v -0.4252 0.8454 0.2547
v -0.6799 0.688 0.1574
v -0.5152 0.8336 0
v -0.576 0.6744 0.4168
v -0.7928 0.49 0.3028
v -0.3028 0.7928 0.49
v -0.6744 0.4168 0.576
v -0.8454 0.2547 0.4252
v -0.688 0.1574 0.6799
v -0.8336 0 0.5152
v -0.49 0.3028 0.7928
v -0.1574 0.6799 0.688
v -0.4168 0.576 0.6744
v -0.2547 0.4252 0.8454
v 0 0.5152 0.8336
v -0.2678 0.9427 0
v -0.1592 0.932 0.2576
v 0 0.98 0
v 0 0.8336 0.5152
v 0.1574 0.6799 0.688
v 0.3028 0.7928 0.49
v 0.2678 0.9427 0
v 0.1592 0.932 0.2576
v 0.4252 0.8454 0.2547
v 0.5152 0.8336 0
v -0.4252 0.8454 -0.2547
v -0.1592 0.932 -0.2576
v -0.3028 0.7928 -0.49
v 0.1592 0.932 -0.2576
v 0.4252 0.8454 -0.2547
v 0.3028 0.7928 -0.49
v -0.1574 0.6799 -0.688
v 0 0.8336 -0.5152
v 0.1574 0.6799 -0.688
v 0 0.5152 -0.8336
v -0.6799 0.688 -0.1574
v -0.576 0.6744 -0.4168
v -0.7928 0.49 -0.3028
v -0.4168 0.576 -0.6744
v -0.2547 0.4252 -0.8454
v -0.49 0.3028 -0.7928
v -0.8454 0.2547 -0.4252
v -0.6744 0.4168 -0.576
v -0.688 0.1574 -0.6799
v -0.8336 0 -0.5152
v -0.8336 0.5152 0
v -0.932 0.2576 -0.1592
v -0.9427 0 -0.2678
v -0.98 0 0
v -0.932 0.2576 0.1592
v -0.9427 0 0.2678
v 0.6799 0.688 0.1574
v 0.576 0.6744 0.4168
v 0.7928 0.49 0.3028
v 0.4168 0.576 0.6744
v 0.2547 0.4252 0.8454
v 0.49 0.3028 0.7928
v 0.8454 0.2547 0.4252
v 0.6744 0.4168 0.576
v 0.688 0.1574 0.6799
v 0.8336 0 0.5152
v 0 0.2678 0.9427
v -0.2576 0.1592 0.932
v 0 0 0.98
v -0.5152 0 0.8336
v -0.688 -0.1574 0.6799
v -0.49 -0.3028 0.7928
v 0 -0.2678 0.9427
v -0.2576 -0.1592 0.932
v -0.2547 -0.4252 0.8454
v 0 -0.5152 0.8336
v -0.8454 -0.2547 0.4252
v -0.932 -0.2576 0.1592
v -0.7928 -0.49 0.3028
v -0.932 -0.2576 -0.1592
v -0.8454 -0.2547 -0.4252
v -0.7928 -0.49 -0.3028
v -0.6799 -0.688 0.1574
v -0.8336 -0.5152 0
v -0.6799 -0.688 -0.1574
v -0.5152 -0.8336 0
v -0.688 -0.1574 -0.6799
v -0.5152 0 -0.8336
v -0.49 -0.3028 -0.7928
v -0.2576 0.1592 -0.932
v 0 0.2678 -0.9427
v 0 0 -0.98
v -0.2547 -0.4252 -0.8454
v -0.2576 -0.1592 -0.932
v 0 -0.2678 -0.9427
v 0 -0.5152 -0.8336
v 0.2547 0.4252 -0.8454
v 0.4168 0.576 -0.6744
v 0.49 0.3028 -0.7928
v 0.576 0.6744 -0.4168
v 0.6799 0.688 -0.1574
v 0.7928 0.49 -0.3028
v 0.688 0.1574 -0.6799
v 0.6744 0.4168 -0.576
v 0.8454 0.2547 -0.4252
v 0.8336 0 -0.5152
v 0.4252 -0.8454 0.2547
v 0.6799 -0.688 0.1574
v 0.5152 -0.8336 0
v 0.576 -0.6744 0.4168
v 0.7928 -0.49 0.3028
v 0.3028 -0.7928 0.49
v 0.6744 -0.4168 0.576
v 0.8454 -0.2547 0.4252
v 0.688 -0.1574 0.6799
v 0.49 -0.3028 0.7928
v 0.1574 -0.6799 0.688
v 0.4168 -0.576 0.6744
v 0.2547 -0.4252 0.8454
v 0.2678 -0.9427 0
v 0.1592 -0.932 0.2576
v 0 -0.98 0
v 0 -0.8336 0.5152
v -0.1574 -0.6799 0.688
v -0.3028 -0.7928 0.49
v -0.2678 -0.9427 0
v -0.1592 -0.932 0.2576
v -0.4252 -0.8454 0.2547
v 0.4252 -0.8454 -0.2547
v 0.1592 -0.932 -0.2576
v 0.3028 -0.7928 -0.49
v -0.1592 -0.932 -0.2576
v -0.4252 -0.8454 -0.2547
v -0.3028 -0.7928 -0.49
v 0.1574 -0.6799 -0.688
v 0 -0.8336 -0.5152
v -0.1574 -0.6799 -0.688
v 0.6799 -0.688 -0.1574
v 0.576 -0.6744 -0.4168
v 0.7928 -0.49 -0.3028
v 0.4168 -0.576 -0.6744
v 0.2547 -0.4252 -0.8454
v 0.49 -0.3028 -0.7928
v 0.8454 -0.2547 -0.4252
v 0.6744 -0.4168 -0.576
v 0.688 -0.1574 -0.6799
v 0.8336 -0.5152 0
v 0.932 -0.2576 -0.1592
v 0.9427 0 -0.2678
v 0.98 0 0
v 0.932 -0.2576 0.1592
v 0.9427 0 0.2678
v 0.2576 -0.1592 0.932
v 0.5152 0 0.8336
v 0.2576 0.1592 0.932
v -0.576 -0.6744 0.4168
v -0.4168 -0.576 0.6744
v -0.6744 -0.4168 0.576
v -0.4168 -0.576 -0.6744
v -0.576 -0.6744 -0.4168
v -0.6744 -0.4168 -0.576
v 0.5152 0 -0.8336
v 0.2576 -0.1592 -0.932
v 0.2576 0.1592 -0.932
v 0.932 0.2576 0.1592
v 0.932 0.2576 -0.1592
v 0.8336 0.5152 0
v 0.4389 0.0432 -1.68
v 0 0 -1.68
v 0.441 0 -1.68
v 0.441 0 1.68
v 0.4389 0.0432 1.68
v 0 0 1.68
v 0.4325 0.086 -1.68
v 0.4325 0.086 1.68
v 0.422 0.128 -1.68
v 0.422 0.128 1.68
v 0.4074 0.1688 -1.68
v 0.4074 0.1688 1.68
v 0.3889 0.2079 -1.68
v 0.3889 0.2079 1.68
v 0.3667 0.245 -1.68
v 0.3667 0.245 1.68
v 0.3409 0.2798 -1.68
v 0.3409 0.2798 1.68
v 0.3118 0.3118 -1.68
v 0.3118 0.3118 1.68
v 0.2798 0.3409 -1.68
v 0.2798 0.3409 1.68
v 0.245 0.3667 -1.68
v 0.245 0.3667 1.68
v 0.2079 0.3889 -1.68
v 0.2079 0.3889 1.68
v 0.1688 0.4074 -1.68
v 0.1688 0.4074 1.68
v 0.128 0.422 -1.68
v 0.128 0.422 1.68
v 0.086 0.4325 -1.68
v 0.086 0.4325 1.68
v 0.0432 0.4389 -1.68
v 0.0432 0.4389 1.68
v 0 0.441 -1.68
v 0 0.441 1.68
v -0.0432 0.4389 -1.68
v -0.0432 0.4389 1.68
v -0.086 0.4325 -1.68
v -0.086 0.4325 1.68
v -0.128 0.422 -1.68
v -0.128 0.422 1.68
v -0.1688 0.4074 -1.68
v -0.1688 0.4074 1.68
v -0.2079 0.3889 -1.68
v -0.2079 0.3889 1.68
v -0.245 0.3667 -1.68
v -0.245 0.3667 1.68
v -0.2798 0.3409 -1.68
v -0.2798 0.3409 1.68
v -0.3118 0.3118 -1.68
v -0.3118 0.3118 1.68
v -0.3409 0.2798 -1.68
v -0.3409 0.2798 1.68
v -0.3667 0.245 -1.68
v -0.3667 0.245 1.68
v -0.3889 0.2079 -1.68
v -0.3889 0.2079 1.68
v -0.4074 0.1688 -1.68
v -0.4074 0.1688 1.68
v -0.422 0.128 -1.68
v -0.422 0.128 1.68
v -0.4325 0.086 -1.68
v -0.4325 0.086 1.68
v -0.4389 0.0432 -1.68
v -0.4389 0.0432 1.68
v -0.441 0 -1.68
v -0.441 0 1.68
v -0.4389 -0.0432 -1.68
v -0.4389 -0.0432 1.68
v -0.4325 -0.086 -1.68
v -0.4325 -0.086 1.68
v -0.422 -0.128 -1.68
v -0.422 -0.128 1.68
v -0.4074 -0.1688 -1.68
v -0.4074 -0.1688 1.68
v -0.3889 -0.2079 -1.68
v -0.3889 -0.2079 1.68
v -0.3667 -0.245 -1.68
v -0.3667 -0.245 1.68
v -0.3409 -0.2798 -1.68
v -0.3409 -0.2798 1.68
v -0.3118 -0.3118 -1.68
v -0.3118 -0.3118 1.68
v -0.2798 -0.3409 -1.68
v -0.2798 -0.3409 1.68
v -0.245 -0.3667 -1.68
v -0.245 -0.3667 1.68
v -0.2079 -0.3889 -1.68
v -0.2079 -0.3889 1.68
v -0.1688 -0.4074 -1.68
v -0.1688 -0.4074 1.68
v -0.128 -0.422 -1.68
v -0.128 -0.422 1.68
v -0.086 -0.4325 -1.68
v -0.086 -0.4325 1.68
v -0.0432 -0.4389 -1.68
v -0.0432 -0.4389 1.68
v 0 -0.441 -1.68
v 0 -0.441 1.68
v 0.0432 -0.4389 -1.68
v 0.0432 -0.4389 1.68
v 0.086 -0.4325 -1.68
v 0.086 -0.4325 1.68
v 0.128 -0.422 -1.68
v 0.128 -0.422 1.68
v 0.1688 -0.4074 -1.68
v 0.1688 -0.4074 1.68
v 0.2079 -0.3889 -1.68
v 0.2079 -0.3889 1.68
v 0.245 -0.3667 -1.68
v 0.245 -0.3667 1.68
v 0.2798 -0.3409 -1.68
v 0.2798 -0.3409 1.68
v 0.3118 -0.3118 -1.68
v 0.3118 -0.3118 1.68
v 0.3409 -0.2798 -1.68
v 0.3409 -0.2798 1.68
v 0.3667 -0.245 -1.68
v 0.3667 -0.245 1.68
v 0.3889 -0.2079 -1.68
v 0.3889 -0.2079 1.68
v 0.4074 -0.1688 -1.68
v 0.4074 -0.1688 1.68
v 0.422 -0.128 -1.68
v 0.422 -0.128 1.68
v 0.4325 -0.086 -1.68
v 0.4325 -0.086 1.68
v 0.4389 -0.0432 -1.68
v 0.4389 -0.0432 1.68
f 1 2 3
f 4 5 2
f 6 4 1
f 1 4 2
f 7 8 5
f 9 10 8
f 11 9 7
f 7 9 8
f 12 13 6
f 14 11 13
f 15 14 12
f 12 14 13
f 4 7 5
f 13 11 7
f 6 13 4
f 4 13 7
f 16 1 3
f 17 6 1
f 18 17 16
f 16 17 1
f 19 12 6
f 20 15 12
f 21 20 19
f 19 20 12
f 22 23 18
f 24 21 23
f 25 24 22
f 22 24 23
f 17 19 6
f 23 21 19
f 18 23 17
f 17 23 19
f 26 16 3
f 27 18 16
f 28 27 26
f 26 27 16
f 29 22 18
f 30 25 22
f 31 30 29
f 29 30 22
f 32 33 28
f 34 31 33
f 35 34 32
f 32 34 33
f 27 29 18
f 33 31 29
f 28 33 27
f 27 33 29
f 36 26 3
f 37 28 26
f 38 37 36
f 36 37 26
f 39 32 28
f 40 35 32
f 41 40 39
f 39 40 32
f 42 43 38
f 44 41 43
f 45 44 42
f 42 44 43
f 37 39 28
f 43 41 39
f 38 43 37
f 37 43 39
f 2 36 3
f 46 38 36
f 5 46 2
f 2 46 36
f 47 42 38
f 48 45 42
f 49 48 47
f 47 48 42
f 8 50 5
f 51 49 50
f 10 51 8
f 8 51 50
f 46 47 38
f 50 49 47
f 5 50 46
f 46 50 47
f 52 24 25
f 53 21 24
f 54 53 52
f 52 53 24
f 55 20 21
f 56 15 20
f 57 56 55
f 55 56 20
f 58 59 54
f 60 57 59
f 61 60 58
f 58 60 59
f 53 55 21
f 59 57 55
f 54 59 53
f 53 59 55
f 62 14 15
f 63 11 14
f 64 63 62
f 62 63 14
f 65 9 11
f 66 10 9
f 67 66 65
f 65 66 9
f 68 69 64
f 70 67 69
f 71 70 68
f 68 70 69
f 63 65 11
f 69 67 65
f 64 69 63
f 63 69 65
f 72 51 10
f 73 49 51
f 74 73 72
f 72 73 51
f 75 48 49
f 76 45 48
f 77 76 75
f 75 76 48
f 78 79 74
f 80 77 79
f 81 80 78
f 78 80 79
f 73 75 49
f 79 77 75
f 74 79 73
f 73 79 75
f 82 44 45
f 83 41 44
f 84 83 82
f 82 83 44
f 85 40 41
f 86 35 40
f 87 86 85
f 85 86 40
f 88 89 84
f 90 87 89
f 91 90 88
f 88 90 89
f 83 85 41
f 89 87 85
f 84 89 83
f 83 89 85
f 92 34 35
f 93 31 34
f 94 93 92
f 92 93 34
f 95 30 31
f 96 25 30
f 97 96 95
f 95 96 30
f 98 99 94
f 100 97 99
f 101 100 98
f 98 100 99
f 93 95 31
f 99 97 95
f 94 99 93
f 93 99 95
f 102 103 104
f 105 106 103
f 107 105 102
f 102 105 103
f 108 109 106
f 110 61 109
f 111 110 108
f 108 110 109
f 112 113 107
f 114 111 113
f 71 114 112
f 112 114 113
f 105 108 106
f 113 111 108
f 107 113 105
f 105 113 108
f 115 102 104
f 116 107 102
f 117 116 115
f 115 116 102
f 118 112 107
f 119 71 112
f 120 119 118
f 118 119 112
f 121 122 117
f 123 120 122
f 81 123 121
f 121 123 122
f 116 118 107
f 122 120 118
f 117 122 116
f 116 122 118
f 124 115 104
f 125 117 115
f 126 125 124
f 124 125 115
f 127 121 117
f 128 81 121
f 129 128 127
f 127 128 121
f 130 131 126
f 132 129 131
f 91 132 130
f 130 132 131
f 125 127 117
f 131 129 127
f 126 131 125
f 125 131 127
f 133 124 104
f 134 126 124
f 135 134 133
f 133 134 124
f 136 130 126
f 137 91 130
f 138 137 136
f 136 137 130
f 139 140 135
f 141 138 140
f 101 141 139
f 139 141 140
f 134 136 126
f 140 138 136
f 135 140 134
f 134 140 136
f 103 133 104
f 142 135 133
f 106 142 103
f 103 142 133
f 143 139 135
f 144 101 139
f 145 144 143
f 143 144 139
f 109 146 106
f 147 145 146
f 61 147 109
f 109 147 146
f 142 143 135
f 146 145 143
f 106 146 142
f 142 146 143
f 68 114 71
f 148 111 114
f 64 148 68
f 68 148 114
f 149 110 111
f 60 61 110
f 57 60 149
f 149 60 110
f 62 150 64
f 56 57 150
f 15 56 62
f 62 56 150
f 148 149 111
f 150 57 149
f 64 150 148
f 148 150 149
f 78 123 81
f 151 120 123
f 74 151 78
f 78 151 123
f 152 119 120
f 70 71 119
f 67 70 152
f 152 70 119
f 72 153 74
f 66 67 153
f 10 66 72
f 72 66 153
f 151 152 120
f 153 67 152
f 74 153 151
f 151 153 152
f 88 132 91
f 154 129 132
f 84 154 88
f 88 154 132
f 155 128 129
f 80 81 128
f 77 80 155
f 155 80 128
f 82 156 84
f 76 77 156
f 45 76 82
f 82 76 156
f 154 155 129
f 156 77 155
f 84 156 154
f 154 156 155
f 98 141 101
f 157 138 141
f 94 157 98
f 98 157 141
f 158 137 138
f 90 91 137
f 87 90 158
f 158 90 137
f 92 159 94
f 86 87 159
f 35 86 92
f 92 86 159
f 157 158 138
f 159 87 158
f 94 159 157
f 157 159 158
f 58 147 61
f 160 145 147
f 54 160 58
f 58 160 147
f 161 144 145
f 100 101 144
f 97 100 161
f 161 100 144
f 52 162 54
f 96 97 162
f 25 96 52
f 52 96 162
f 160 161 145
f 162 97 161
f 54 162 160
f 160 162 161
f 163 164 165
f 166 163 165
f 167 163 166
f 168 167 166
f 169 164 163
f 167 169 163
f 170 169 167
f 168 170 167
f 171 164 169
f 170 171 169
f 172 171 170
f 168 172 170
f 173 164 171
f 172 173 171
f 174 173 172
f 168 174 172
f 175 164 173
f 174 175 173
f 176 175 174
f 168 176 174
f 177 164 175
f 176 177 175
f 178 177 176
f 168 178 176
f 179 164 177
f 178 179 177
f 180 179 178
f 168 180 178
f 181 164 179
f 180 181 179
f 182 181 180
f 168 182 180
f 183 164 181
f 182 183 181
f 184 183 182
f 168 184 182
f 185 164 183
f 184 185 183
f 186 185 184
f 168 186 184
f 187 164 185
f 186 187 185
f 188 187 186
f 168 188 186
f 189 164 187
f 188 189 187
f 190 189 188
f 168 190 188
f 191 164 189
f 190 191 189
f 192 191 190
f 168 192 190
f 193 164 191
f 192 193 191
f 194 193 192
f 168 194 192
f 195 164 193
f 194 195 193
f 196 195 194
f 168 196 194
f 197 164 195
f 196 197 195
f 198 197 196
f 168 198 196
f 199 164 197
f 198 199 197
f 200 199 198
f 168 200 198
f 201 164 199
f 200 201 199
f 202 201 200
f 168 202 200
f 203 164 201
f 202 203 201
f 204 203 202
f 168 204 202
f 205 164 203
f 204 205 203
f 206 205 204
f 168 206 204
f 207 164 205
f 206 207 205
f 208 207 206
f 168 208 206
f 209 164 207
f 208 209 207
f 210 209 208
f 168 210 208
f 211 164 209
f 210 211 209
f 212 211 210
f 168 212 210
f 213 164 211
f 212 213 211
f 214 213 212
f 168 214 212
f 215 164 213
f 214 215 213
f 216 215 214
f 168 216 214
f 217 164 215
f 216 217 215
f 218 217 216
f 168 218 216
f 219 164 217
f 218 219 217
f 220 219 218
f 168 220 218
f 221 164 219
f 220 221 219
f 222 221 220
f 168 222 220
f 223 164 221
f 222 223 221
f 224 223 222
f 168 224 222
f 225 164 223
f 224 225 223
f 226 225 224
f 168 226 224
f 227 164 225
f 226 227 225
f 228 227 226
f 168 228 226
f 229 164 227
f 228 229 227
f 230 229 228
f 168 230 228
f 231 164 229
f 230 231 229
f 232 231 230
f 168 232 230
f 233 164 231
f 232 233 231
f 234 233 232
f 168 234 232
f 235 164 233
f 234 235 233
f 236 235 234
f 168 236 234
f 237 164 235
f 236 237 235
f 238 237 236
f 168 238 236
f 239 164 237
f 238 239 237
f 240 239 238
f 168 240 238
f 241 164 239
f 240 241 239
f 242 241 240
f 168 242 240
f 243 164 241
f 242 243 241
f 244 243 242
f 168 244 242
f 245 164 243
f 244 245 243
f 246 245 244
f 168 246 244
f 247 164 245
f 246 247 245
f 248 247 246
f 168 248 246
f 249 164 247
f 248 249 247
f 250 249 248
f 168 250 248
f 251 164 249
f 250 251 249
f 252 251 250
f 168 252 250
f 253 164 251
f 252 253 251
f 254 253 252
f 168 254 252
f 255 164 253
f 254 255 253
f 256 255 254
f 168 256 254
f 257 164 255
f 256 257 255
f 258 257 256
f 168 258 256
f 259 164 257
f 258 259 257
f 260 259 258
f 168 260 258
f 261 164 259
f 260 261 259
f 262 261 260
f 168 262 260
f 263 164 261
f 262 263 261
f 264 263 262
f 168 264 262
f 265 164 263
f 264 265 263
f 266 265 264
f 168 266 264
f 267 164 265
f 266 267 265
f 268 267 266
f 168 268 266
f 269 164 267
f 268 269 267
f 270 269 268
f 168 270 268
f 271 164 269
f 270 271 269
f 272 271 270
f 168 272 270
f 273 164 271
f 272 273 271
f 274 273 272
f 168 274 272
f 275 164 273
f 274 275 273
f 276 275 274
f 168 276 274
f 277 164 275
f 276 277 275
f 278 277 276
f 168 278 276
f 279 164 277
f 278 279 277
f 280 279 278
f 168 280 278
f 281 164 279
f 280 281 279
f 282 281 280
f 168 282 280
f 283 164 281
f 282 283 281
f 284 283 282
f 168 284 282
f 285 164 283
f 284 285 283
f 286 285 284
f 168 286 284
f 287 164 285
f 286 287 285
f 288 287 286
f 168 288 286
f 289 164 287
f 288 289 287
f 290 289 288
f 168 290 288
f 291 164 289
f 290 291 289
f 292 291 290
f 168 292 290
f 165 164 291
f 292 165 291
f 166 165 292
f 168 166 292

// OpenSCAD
polyhedron(points=[
  [-0.5152164898767507, 0.833637792184999, 0.0],
  [0.5152164898767507, 0.833637792184999, 0.0],
  [-0.5152164898767507, -0.833637792184999, 0.0],
  [0.5152164898767507, -0.833637792184999, 0.0],
  [0.0, -0.5152164898767507, 0.833637792184999],
  [0.0, 0.5152164898767507, 0.833637792184999],
  [0.0, -0.5152164898767507, -0.833637792184999],
  [0.0, 0.5152164898767507, -0.833637792184999],
  [0.833637792184999, 0.0, -0.5152164898767507],
  [0.833637792184999, 0.0, 0.5152164898767507],
  [-0.833637792184999, 0.0, -0.5152164898767507],
  [-0.833637792184999, 0.0, 0.5152164898767507],
  [0.0, 0.9799999999999999, 0.0],
  [0.0, -0.9799999999999999, 0.0],
  [-0.3028366544874484, -0.7928366544874483, 0.48999999999999994],
  [0.3028366544874484, -0.7928366544874483, 0.48999999999999994],
  [-0.3028366544874484, 0.7928366544874483, 0.48999999999999994],
  [0.3028366544874484, 0.7928366544874483, 0.48999999999999994],
  [0.0, 0.0, 0.9799999999999999],
  [-0.3028366544874484, -0.7928366544874483, -0.48999999999999994],
  [0.3028366544874484, -0.7928366544874483, -0.48999999999999994],
  [-0.3028366544874484, 0.7928366544874483, -0.48999999999999994],
  [0.3028366544874484, 0.7928366544874483, -0.48999999999999994],
  [0.0, 0.0, -0.9799999999999999],
  [0.7928366544874483, 0.48999999999999994, -0.3028366544874484],
  [0.7928366544874483, -0.48999999999999994, -0.3028366544874484],
  [0.48999999999999994, -0.3028366544874484, -0.7928366544874483],
  [0.48999999999999994, 0.3028366544874484, -0.7928366544874483],
  [0.7928366544874483, 0.48999999999999994, 0.3028366544874484],
  [0.7928366544874483, -0.48999999999999994, 0.3028366544874484],
  [0.48999999999999994, -0.3028366544874484, 0.7928366544874483],
  [0.48999999999999994, 0.3028366544874484, 0.7928366544874483],
  [0.9799999999999999, 0.0, 0.0],
  [-0.7928366544874483, 0.48999999999999994, -0.3028366544874484],
  [-0.7928366544874483, -0.48999999999999994, -0.3028366544874484],
  [-0.48999999999999994, -0.3028366544874484, -0.7928366544874483],
  [-0.48999999999999994, 0.3028366544874484, -0.7928366544874483],
  [-0.7928366544874483, 0.48999999999999994, 0.3028366544874484],
  [-0.7928366544874483, -0.48999999999999994, 0.3028366544874484],
  [-0.48999999999999994, -0.3028366544874484, 0.7928366544874483],
  [-0.48999999999999994, 0.3028366544874484, 0.7928366544874483],
  [-0.9799999999999999, 0.0, 0.0],
  [-0.26780119833441823, 0.9426995906282389, 0.0],
  [0.26780119833441823, 0.9426995906282389, 0.0],
  [-0.26780119833441823, -0.9426995906282389, 0.0],
  [0.26780119833441823, -0.9426995906282389, 0.0],
  [-0.4252107932616408, -0.8454151108078624, 0.2546940747475993],
  [-0.15740959492722262, -0.6799048680092401, 0.6880055158806397],
  [-0.15921065115412408, -0.9320353859692504, 0.2576082449383755],
  [0.4252107932616408, -0.8454151108078624, 0.2546940747475993],
  [0.15740959492722262, -0.6799048680092401, 0.6880055158806397],
  [0.15921065115412408, -0.9320353859692504, 0.2576082449383755],
  [0.0, -0.8336377921849991, 0.515216489876751],
  [-0.4252107932616408, 0.8454151108078624, 0.2546940747475993],
  [-0.15740959492722262, 0.6799048680092401, 0.6880055158806397],
  [-0.15921065115412408, 0.9320353859692504, 0.2576082449383755],
  [0.4252107932616408, 0.8454151108078624, 0.2546940747475993],
  [0.15740959492722262, 0.6799048680092401, 0.6880055158806397],
  [0.15921065115412408, 0.9320353859692504, 0.2576082449383755],
  [0.0, 0.8336377921849991, 0.515216489876751],
  [0.0, -0.26780119833441823, 0.9426995906282389],
  [0.0, 0.26780119833441823, 0.9426995906282389],
  [-0.4252107932616408, -0.8454151108078624, -0.2546940747475993],
  [-0.15740959492722262, -0.6799048680092401, -0.6880055158806397],
  [-0.15921065115412408, -0.9320353859692504, -0.2576082449383755],
  [0.4252107932616408, -0.8454151108078624, -0.2546940747475993],
  [0.15740959492722262, -0.6799048680092401, -0.6880055158806397],
  [0.15921065115412408, -0.9320353859692504, -0.2576082449383755],
  [0.0, -0.8336377921849991, -0.515216489876751],
  [-0.4252107932616408, 0.8454151108078624, -0.2546940747475993],
  [-0.15740959492722262, 0.6799048680092401, -0.6880055158806397],
  [-0.15921065115412408, 0.9320353859692504, -0.2576082449383755],
  [0.4252107932616408, 0.8454151108078624, -0.2546940747475993],
  [0.15740959492722262, 0.6799048680092401, -0.6880055158806397],
  [0.15921065115412408, 0.9320353859692504, -0.2576082449383755],
  [0.0, 0.8336377921849991, -0.515216489876751],
  [0.0, -0.26780119833441823, -0.9426995906282389],
  [0.0, 0.26780119833441823, -0.9426995906282389],
  [0.6799048680092402, 0.6880055158806397, -0.15740959492722265],
  [0.8454151108078624, 0.2546940747475993, -0.4252107932616409],
  [0.5760295472466236, 0.674427141030875, -0.4168188960924995],
  [0.6799048680092402, -0.6880055158806397, -0.15740959492722265],
  [0.8454151108078624, -0.2546940747475993, -0.4252107932616409],
  [0.5760295472466236, -0.674427141030875, -0.4168188960924995],
  [0.2546940747475993, -0.4252107932616409, -0.8454151108078624],
  [0.6880055158806397, -0.15740959492722265, -0.6799048680092402],
  [0.4168188960924995, -0.5760295472466236, -0.674427141030875],
  [0.2576082449383755, -0.15921065115412408, -0.9320353859692504],
  [0.674427141030875, -0.41681889609249956, -0.5760295472466236],
  [0.2546940747475993, 0.4252107932616409, -0.8454151108078624],
  [0.6880055158806397, 0.15740959492722265, -0.6799048680092402],
  [0.4168188960924995, 0.5760295472466236, -0.674427141030875],
  [0.2576082449383755, 0.15921065115412408, -0.9320353859692504],
  [0.674427141030875, 0.41681889609249956, -0.5760295472466236],
  [0.5152164898767508, 0.0, -0.833637792184999],
  [0.6799048680092402, 0.6880055158806397, 0.15740959492722265],
  [0.8454151108078624, 0.2546940747475993, 0.4252107932616409],
  [0.5760295472466236, 0.674427141030875, 0.4168188960924995],
  [0.833637792184999, 0.5152164898767508, 0.0],
  [0.6799048680092402, -0.6880055158806397, 0.15740959492722265],
  [0.8454151108078624, -0.2546940747475993, 0.4252107932616409],
  [0.5760295472466236, -0.674427141030875, 0.4168188960924995],
  [0.833637792184999, -0.5152164898767508, 0.0],
  [0.2546940747475993, -0.4252107932616409, 0.8454151108078624],
  [0.6880055158806397, -0.15740959492722265, 0.6799048680092402],
  [0.4168188960924995, -0.5760295472466236, 0.674427141030875],
  [0.2576082449383755, -0.15921065115412408, 0.9320353859692504],
  [0.674427141030875, -0.41681889609249956, 0.5760295472466236],
  [0.2546940747475993, 0.4252107932616409, 0.8454151108078624],
  [0.6880055158806397, 0.15740959492722265, 0.6799048680092402],
  [0.4168188960924995, 0.5760295472466236, 0.674427141030875],
  [0.2576082449383755, 0.15921065115412408, 0.9320353859692504],
  [0.674427141030875, 0.41681889609249956, 0.5760295472466236],
  [0.5152164898767508, 0.0, 0.833637792184999],
  [0.9426995906282389, 0.0, -0.26780119833441823],
  [0.9426995906282389, 0.0, 0.26780119833441823],
  [0.9320353859692504, 0.2576082449383755, -0.15921065115412408],
  [0.9320353859692504, -0.2576082449383755, -0.15921065115412408],
  [0.9320353859692504, 0.2576082449383755, 0.15921065115412408],
  [0.9320353859692504, -0.2576082449383755, 0.15921065115412408],
  [-0.6799048680092402, 0.6880055158806397, -0.15740959492722265],
  [-0.8454151108078624, 0.2546940747475993, -0.4252107932616409],
  [-0.5760295472466236, 0.674427141030875, -0.4168188960924995],
  [-0.6799048680092402, -0.6880055158806397, -0.15740959492722265],
  [-0.8454151108078624, -0.2546940747475993, -0.4252107932616409],
  [-0.5760295472466236, -0.674427141030875, -0.4168188960924995],
  [-0.2546940747475993, -0.4252107932616409, -0.8454151108078624],
  [-0.6880055158806397, -0.15740959492722265, -0.6799048680092402],
  [-0.4168188960924995, -0.5760295472466236, -0.674427141030875],
  [-0.2576082449383755, -0.15921065115412408, -0.9320353859692504],
  [-0.674427141030875, -0.41681889609249956, -0.5760295472466236],
  [-0.2546940747475993, 0.4252107932616409, -0.8454151108078624],
  [-0.6880055158806397, 0.15740959492722265, -0.6799048680092402],
  [-0.4168188960924995, 0.5760295472466236, -0.674427141030875],
  [-0.2576082449383755, 0.15921065115412408, -0.9320353859692504],
  [-0.674427141030875, 0.41681889609249956, -0.5760295472466236],
  [-0.5152164898767508, 0.0, -0.833637792184999],
  [-0.6799048680092402, 0.6880055158806397, 0.15740959492722265],
  [-0.8454151108078624, 0.2546940747475993, 0.4252107932616409],
  [-0.5760295472466236, 0.674427141030875, 0.4168188960924995],
  [-0.833637792184999, 0.5152164898767508, 0.0],
  [-0.6799048680092402, -0.6880055158806397, 0.15740959492722265],
  [-0.8454151108078624, -0.2546940747475993, 0.4252107932616409],
  [-0.5760295472466236, -0.674427141030875, 0.4168188960924995],
  [-0.833637792184999, -0.5152164898767508, 0.0],
  [-0.2546940747475993, -0.4252107932616409, 0.8454151108078624],
  [-0.6880055158806397, -0.15740959492722265, 0.6799048680092402],
  [-0.4168188960924995, -0.5760295472466236, 0.674427141030875],
  [-0.2576082449383755, -0.15921065115412408, 0.9320353859692504],
  [-0.674427141030875, -0.41681889609249956, 0.5760295472466236],
  [-0.2546940747475993, 0.4252107932616409, 0.8454151108078624],
  [-0.6880055158806397, 0.15740959492722265, 0.6799048680092402],
  [-0.4168188960924995, 0.5760295472466236, 0.674427141030875],
  [-0.2576082449383755, 0.15921065115412408, 0.9320353859692504],
  [-0.674427141030875, 0.41681889609249956, 0.5760295472466236],
  [-0.5152164898767508, 0.0, 0.833637792184999],
  [-0.9426995906282389, 0.0, -0.26780119833441823],
  [-0.9426995906282389, 0.0, 0.26780119833441823],
  [-0.9320353859692504, 0.2576082449383755, -0.15921065115412408],
  [-0.9320353859692504, -0.2576082449383755, -0.15921065115412408],
  [-0.9320353859692504, 0.2576082449383755, 0.15921065115412408],
  [-0.9320353859692504, -0.2576082449383755, 0.15921065115412408],
  [0.0, 0.0, -1.68],
  [0.44099999999999995, 0.0, -1.68],
  [0.44099999999999995, 0.0, 1.68],
  [0.0, 0.0, 1.68],
  [0.4388764644624388, 0.04322555888533622, -1.68],
  [0.4388764644624388, 0.04322555888533622, 1.68],
  [0.43252630865782454, 0.08603483200911255, -1.68],
  [0.43252630865782454, 0.08603483200911255, 1.68],
  [0.42201068805790404, 0.12801554266921789, -1.68],
  [0.42201068805790404, 0.12801554266921789, 1.68],
  [0.4074308738374774, 0.16876339367300458, -1.68],
  [0.4074308738374774, 0.16876339367300458, 1.68],
  [0.3889272775776245, 0.20788596094026493, -1.68],
  [0.3889272775776245, 0.20788596094026493, 1.68],
  [0.3666780990254224, 0.24500647276164453, -1.68],
  [0.3666780990254224, 0.24500647276164453, 1.68],
  [0.34089760993296697, 0.2797674383161676, -1.68],
  [0.34089760993296697, 0.2797674383161676, 1.68],
  [0.31183409050326744, 0.3118340905032674, -1.68],
  [0.31183409050326744, 0.3118340905032674, 1.68],
  [0.2797674383161676, 0.34089760993296697, -1.68],
  [0.2797674383161676, 0.34089760993296697, 1.68],
  [0.24500647276164458, 0.3666780990254224, -1.68],
  [0.24500647276164458, 0.3666780990254224, 1.68],
  [0.207885960940265, 0.38892727757762446, -1.68],
  [0.207885960940265, 0.38892727757762446, 1.68],
  [0.1687633936730046, 0.4074308738374774, -1.68],
  [0.1687633936730046, 0.4074308738374774, 1.68],
  [0.12801554266921789, 0.4220106880579041, -1.68],
  [0.12801554266921789, 0.4220106880579041, 1.68],
  [0.08603483200911258, 0.43252630865782454, -1.68],
  [0.08603483200911258, 0.43252630865782454, 1.68],
  [0.043225558885336295, 0.4388764644624387, -1.68],
  [0.043225558885336295, 0.4388764644624387, 1.68],
  [2.7003461921199134e-17, 0.44099999999999995, -1.68],
  [2.7003461921199134e-17, 0.44099999999999995, 1.68],
  [-0.04322555888533624, 0.4388764644624388, -1.68],
  [-0.04322555888533624, 0.4388764644624388, 1.68],
  [-0.08603483200911252, 0.43252630865782454, -1.68],
  [-0.08603483200911252, 0.43252630865782454, 1.68],
  [-0.1280155426692178, 0.4220106880579041, -1.68],
  [-0.1280155426692178, 0.4220106880579041, 1.68],
  [-0.16876339367300455, 0.4074308738374774, -1.68],
  [-0.16876339367300455, 0.4074308738374774, 1.68],
  [-0.20788596094026496, 0.3889272775776245, -1.68],
  [-0.20788596094026496, 0.3889272775776245, 1.68],
  [-0.24500647276164444, 0.3666780990254225, -1.68],
  [-0.24500647276164444, 0.3666780990254225, 1.68],
  [-0.27976743831616757, 0.340897609932967, -1.68],
  [-0.27976743831616757, 0.340897609932967, 1.68],
  [-0.3118340905032674, 0.31183409050326744, -1.68],
  [-0.3118340905032674, 0.31183409050326744, 1.68],
  [-0.34089760993296697, 0.2797674383161676, -1.68],
  [-0.34089760993296697, 0.2797674383161676, 1.68],
  [-0.3666780990254225, 0.24500647276164453, -1.68],
  [-0.3666780990254225, 0.24500647276164453, 1.68],
  [-0.38892727757762446, 0.20788596094026504, -1.68],
  [-0.38892727757762446, 0.20788596094026504, 1.68],
  [-0.4074308738374774, 0.16876339367300464, -1.68],
  [-0.4074308738374774, 0.16876339367300464, 1.68],
  [-0.42201068805790404, 0.12801554266921789, -1.68],
  [-0.42201068805790404, 0.12801554266921789, 1.68],
  [-0.43252630865782454, 0.0860348320091127, -1.68],
  [-0.43252630865782454, 0.0860348320091127, 1.68],
  [-0.4388764644624387, 0.04322555888533632, -1.68],
  [-0.4388764644624387, 0.04322555888533632, 1.68],
  [-0.44099999999999995, 5.400692384239827e-17, -1.68],
  [-0.44099999999999995, 5.400692384239827e-17, 1.68],
  [-0.4388764644624388, -0.04322555888533622, -1.68],
  [-0.4388764644624388, -0.04322555888533622, 1.68],
  [-0.43252630865782454, -0.08603483200911259, -1.68],
  [-0.43252630865782454, -0.08603483200911259, 1.68],
  [-0.4220106880579041, -0.12801554266921777, -1.68],
  [-0.4220106880579041, -0.12801554266921777, 1.68],
  [-0.40743087383747745, -0.16876339367300452, -1.68],
  [-0.40743087383747745, -0.16876339367300452, 1.68],
  [-0.3889272775776245, -0.20788596094026493, -1.68],
  [-0.3889272775776245, -0.20788596094026493, 1.68],
  [-0.3666780990254225, -0.24500647276164444, -1.68],
  [-0.3666780990254225, -0.24500647276164444, 1.68],
  [-0.340897609932967, -0.2797674383161675, -1.68],
  [-0.340897609932967, -0.2797674383161675, 1.68],
  [-0.3118340905032675, -0.3118340905032674, -1.68],
  [-0.3118340905032675, -0.3118340905032674, 1.68],
  [-0.27976743831616785, -0.3408976099329668, -1.68],
  [-0.27976743831616785, -0.3408976099329668, 1.68],
  [-0.24500647276164453, -0.3666780990254224, -1.68],
  [-0.24500647276164453, -0.3666780990254224, 1.68],
  [-0.20788596094026504, -0.38892727757762446, -1.68],
  [-0.20788596094026504, -0.38892727757762446, 1.68],
  [-0.16876339367300483, -0.4074308738374773, -1.68],
  [-0.16876339367300483, -0.4074308738374773, 1.68],
  [-0.1280155426692179, -0.42201068805790404, -1.68],
  [-0.1280155426692179, -0.42201068805790404, 1.68],
  [-0.08603483200911273, -0.43252630865782454, -1.68],
  [-0.08603483200911273, -0.43252630865782454, 1.68],
  [-0.043225558885336156, -0.4388764644624388, -1.68],
  [-0.043225558885336156, -0.4388764644624388, 1.68],
  [-8.10103857635974e-17, -0.44099999999999995, -1.68],
  [-8.10103857635974e-17, -0.44099999999999995, 1.68],
  [0.043225558885335996, -0.4388764644624388, -1.68],
  [0.043225558885335996, -0.4388764644624388, 1.68],
  [0.08603483200911258, -0.43252630865782454, -1.68],
  [0.08603483200911258, -0.43252630865782454, 1.68],
  [0.12801554266921775, -0.4220106880579041, -1.68],
  [0.12801554266921775, -0.4220106880579041, 1.68],
  [0.16876339367300466, -0.40743087383747734, -1.68],
  [0.16876339367300466, -0.40743087383747734, 1.68],
  [0.2078859609402649, -0.3889272775776245, -1.68],
  [0.2078859609402649, -0.3889272775776245, 1.68],
  [0.2450064727616444, -0.3666780990254225, -1.68],
  [0.2450064727616444, -0.3666780990254225, 1.68],
  [0.2797674383161677, -0.3408976099329669, -1.68],
  [0.2797674383161677, -0.3408976099329669, 1.68],
  [0.3118340905032673, -0.3118340905032675, -1.68],
  [0.3118340905032673, -0.3118340905032675, 1.68],
  [0.3408976099329668, -0.27976743831616785, -1.68],
  [0.3408976099329668, -0.27976743831616785, 1.68],
  [0.3666780990254224, -0.24500647276164453, -1.68],
  [0.3666780990254224, -0.24500647276164453, 1.68],
  [0.3889272775776244, -0.20788596094026507, -1.68],
  [0.3889272775776244, -0.20788596094026507, 1.68],
  [0.4074308738374773, -0.16876339367300483, -1.68],
  [0.4074308738374773, -0.16876339367300483, 1.68],
  [0.42201068805790404, -0.12801554266921794, -1.68],
  [0.42201068805790404, -0.12801554266921794, 1.68],
  [0.43252630865782454, -0.08603483200911276, -1.68],
  [0.43252630865782454, -0.08603483200911276, 1.68],
  [0.4388764644624388, -0.04322555888533618, -1.68],
  [0.4388764644624388, -0.04322555888533618, 1.68],
], faces=[
  [0, 137, 53],
  [137, 37, 139],
  [53, 139, 16],
  [137, 139, 53],
  [37, 138, 154],
  [138, 11, 151],
  [154, 151, 40],
  [138, 151, 154],
  [16, 152, 54],
  [152, 40, 150],
  [54, 150, 5],
  [152, 150, 54],
  [37, 154, 139],
  [154, 40, 152],
  [139, 152, 16],
  [154, 152, 139],
  [0, 53, 42],
  [53, 16, 55],
  [42, 55, 12],
  [53, 55, 42],
  [16, 54, 59],
  [54, 5, 57],
  [59, 57, 17],
  [54, 57, 59],
  [12, 58, 43],
  [58, 17, 56],
  [43, 56, 1],
  [58, 56, 43],
  [16, 59, 55],
  [59, 17, 58],
  [55, 58, 12],
  [59, 58, 55],
  [0, 42, 69],
  [42, 12, 71],
  [69, 71, 21],
  [42, 71, 69],
  [12, 43, 74],
  [43, 1, 72],
  [74, 72, 22],
  [43, 72, 74],
  [21, 75, 70],
  [75, 22, 73],
  [70, 73, 7],
  [75, 73, 70],
  [12, 74, 71],
  [74, 22, 75],
  [71, 75, 21],
  [74, 75, 71],
  [0, 69, 120],
  [69, 21, 122],
  [120, 122, 33],
  [69, 122, 120],
  [21, 70, 133],
  [70, 7, 131],
  [133, 131, 36],
  [70, 131, 133],
  [33, 135, 121],
  [135, 36, 132],
  [121, 132, 10],
  [135, 132, 121],
  [21, 133, 122],
  [133, 36, 135],
  [122, 135, 33],
  [133, 135, 122],
  [0, 120, 137],
  [120, 33, 140],
  [137, 140, 37],
  [120, 140, 137],
  [33, 121, 158],
  [121, 10, 156],
  [158, 156, 41],
  [121, 156, 158],
  [37, 160, 138],
  [160, 41, 157],
  [138, 157, 11],
  [160, 157, 138],
  [33, 158, 140],
  [158, 41, 160],
  [140, 160, 37],
  [158, 160, 140],
  [1, 56, 95],
  [56, 17, 97],
  [95, 97, 28],
  [56, 97, 95],
  [17, 57, 110],
  [57, 5, 108],
  [110, 108, 31],
  [57, 108, 110],
  [28, 112, 96],
  [112, 31, 109],
  [96, 109, 9],
  [112, 109, 96],
  [17, 110, 97],
  [110, 31, 112],
  [97, 112, 28],
  [110, 112, 97],
  [5, 150, 61],
  [150, 40, 153],
  [61, 153, 18],
  [150, 153, 61],
  [40, 151, 155],
  [151, 11, 146],
  [155, 146, 39],
  [151, 146, 155],
  [18, 148, 60],
  [148, 39, 145],
  [60, 145, 4],
  [148, 145, 60],
  [40, 155, 153],
  [155, 39, 148],
  [153, 148, 18],
  [155, 148, 153],
  [11, 157, 142],
  [157, 41, 161],
  [142, 161, 38],
  [157, 161, 142],
  [41, 156, 159],
  [156, 10, 124],
  [159, 124, 34],
  [156, 124, 159],
  [38, 144, 141],
  [144, 34, 123],
  [141, 123, 2],
  [144, 123, 141],
  [41, 159, 161],
  [159, 34, 144],
  [161, 144, 38],
  [159, 144, 161],
  [10, 132, 127],
  [132, 36, 136],
  [127, 136, 35],
  [132, 136, 127],
  [36, 131, 134],
  [131, 7, 77],
  [134, 77, 23],
  [131, 77, 134],
  [35, 129, 126],
  [129, 23, 76],
  [126, 76, 6],
  [129, 76, 126],
  [36, 134, 136],
  [134, 23, 129],
  [136, 129, 35],
  [134, 129, 136],
  [7, 73, 89],
  [73, 22, 91],
  [89, 91, 27],
  [73, 91, 89],
  [22, 72, 80],
  [72, 1, 78],
  [80, 78, 24],
  [72, 78, 80],
  [27, 93, 90],
  [93, 24, 79],
  [90, 79, 8],
  [93, 79, 90],
  [22, 80, 91],
  [80, 24, 93],
  [91, 93, 27],
  [80, 93, 91],
  [3, 99, 49],
  [99, 29, 101],
  [49, 101, 15],
  [99, 101, 49],
  [29, 100, 107],
  [100, 9, 104],
  [107, 104, 30],
  [100, 104, 107],
  [15, 105, 50],
  [105, 30, 103],
  [50, 103, 4],
  [105, 103, 50],
  [29, 107, 101],
  [107, 30, 105],
  [101, 105, 15],
  [107, 105, 101],
  [3, 49, 45],
  [49, 15, 51],
  [45, 51, 13],
  [49, 51, 45],
  [15, 50, 52],
  [50, 4, 47],
  [52, 47, 14],
  [50, 47, 52],
  [13, 48, 44],
  [48, 14, 46],
  [44, 46, 2],
  [48, 46, 44],
  [15, 52, 51],
  [52, 14, 48],
  [51, 48, 13],
  [52, 48, 51],
  [3, 45, 65],
  [45, 13, 67],
  [65, 67, 20],
  [45, 67, 65],
  [13, 44, 64],
  [44, 2, 62],
  [64, 62, 19],
  [44, 62, 64],
  [20, 68, 66],
  [68, 19, 63],
  [66, 63, 6],
  [68, 63, 66],
  [13, 64, 67],
  [64, 19, 68],
  [67, 68, 20],
  [64, 68, 67],
  [3, 65, 81],
  [65, 20, 83],
  [81, 83, 25],
  [65, 83, 81],
  [20, 66, 86],
  [66, 6, 84],
  [86, 84, 26],
  [66, 84, 86],
  [25, 88, 82],
  [88, 26, 85],
  [82, 85, 8],
  [88, 85, 82],
  [20, 86, 83],
  [86, 26, 88],
  [83, 88, 25],
  [86, 88, 83],
  [3, 81, 99],
  [81, 25, 102],
  [99, 102, 29],
  [81, 102, 99],
  [25, 82, 117],
  [82, 8, 114],
  [117, 114, 32],
  [82, 114, 117],
  [29, 119, 100],
  [119, 32, 115],
  [100, 115, 9],
  [119, 115, 100],
  [25, 117, 102],
  [117, 32, 119],
  [102, 119, 29],
  [117, 119, 102],
  [4, 103, 60],
  [103, 30, 106],
  [60, 106, 18],
  [103, 106, 60],
  [30, 104, 113],
  [104, 9, 109],
  [113, 109, 31],
  [104, 109, 113],
  [18, 111, 61],
  [111, 31, 108],
  [61, 108, 5],
  [111, 108, 61],
  [30, 113, 106],
  [113, 31, 111],
  [106, 111, 18],
  [113, 111, 106],
  [2, 46, 141],
  [46, 14, 143],
  [141, 143, 38],
  [46, 143, 141],
  [14, 47, 147],
  [47, 4, 145],
  [147, 145, 39],
  [47, 145, 147],
  [38, 149, 142],
  [149, 39, 146],
  [142, 146, 11],
  [149, 146, 142],
  [14, 147, 143],
  [147, 39, 149],
  [143, 149, 38],
  [147, 149, 143],
  [6, 63, 126],
  [63, 19, 128],
  [126, 128, 35],
  [63, 128, 126],
  [19, 62, 125],
  [62, 2, 123],
  [125, 123, 34],
  [62, 123, 125],
  [35, 130, 127],
  [130, 34, 124],
  [127, 124, 10],
  [130, 124, 127],
  [19, 125, 128],
  [125, 34, 130],
  [128, 130, 35],
  [125, 130, 128],
  [8, 85, 90],
  [85, 26, 94],
  [90, 94, 27],
  [85, 94, 90],
  [26, 84, 87],
  [84, 6, 76],
  [87, 76, 23],
  [84, 76, 87],
  [27, 92, 89],
  [92, 23, 77],
  [89, 77, 7],
  [92, 77, 89],
  [26, 87, 94],
  [87, 23, 92],
  [94, 92, 27],
  [87, 92, 94],
  [9, 115, 96],
  [115, 32, 118],
  [96, 118, 28],
  [115, 118, 96],
  [32, 114, 116],
  [114, 8, 79],
  [116, 79, 24],
  [114, 79, 116],
  [28, 98, 95],
  [98, 24, 78],
  [95, 78, 1],
  [98, 78, 95],
  [32, 116, 118],
  [116, 24, 98],
  [118, 98, 28],
  [116, 98, 118],
  [163, 162, 166],
  [163, 166, 164],
  [164, 166, 167],
  [164, 167, 165],
  [166, 162, 168],
  [166, 168, 167],
  [167, 168, 169],
  [167, 169, 165],
  [168, 162, 170],
  [168, 170, 169],
  [169, 170, 171],
  [169, 171, 165],
  [170, 162, 172],
  [170, 172, 171],
  [171, 172, 173],
  [171, 173, 165],
  [172, 162, 174],
  [172, 174, 173],
  [173, 174, 175],
  [173, 175, 165],
  [174, 162, 176],
  [174, 176, 175],
  [175, 176, 177],
  [175, 177, 165],
  [176, 162, 178],
  [176, 178, 177],
  [177, 178, 179],
  [177, 179, 165],
  [178, 162, 180],
  [178, 180, 179],
  [179, 180, 181],
  [179, 181, 165],
  [180, 162, 182],
  [180, 182, 181],
  [181, 182, 183],
  [181, 183, 165],
  [182, 162, 184],
  [182, 184, 183],
  [183, 184, 185],
  [183, 185, 165],
  [184, 162, 186],
  [184, 186, 185],
  [185, 186, 187],
  [185, 187, 165],
  [186, 162, 188],
  [186, 188, 187],
  [187, 188, 189],
  [187, 189, 165],
  [188, 162, 190],
  [188, 190, 189],
  [189, 190, 191],
  [189, 191, 165],
  [190, 162, 192],
  [190, 192, 191],
  [191, 192, 193],
  [191, 193, 165],
  [192, 162, 194],
  [192, 194, 193],
  [193, 194, 195],
  [193, 195, 165],
  [194, 162, 196],
  [194, 196, 195],
  [195, 196, 197],
  [195, 197, 165],
  [196, 162, 198],
  [196, 198, 197],
  [197, 198, 199],
  [197, 199, 165],
  [198, 162, 200],
  [198, 200, 199],
  [199, 200, 201],
  [199, 201, 165],
  [200, 162, 202],
  [200, 202, 201],
  [201, 202, 203],
  [201, 203, 165],
  [202, 162, 204],
  [202, 204, 203],
  [203, 204, 205],
  [203, 205, 165],
  [204, 162, 206],
  [204, 206, 205],
  [205, 206, 207],
  [205, 207, 165],
  [206, 162, 208],
  [206, 208, 207],
  [207, 208, 209],
  [207, 209, 165],
  [208, 162, 210],
  [208, 210, 209],
  [209, 210, 211],
  [209, 211, 165],
  [210, 162, 212],
  [210, 212, 211],
  [211, 212, 213],
  [211, 213, 165],
  [212, 162, 214],
  [212, 214, 213],
  [213, 214, 215],
  [213, 215, 165],
  [214, 162, 216],
  [214, 216, 215],
  [215, 216, 217],
  [215, 217, 165],
  [216, 162, 218],
  [216, 218, 217],
  [217, 218, 219],
  [217, 219, 165],
  [218, 162, 220],
  [218, 220, 219],
  [219, 220, 221],
  [219, 221, 165],
  [220, 162, 222],
  [220, 222, 221],
  [221, 222, 223],
  [221, 223, 165],
  [222, 162, 224],
  [222, 224, 223],
  [223, 224, 225],
  [223, 225, 165],
  [224, 162, 226],
  [224, 226, 225],
  [225, 226, 227],
  [225, 227, 165],
  [226, 162, 228],
  [226, 228, 227],
  [227, 228, 229],
  [227, 229, 165],
  [228, 162, 230],
  [228, 230, 229],
  [229, 230, 231],
  [229, 231, 165],
  [230, 162, 232],
  [230, 232, 231],
  [231, 232, 233],
  [231, 233, 165],
  [232, 162, 234],
  [232, 234, 233],
  [233, 234, 235],
  [233, 235, 165],
  [234, 162, 236],
  [234, 236, 235],
  [235, 236, 237],
  [235, 237, 165],
  [236, 162, 238],
  [236, 238, 237],
  [237, 238, 239],
  [237, 239, 165],
  [238, 162, 240],
  [238, 240, 239],
  [239, 240, 241],
  [239, 241, 165],
  [240, 162, 242],
  [240, 242, 241],
  [241, 242, 243],
  [241, 243, 165],
  [242, 162, 244],
  [242, 244, 243],
  [243, 244, 245],
  [243, 245, 165],
  [244, 162, 246],
  [244, 246, 245],
  [245, 246, 247],
  [245, 247, 165],
  [246, 162, 248],
  [246, 248, 247],
  [247, 248, 249],
  [247, 249, 165],
  [248, 162, 250],
  [248, 250, 249],
  [249, 250, 251],
  [249, 251, 165],
  [250, 162, 252],
  [250, 252, 251],
  [251, 252, 253],
  [251, 253, 165],
  [252, 162, 254],
  [252, 254, 253],
  [253, 254, 255],
  [253, 255, 165],
  [254, 162, 256],
  [254, 256, 255],
  [255, 256, 257],
  [255, 257, 165],
  [256, 162, 258],
  [256, 258, 257],
  [257, 258, 259],
  [257, 259, 165],
  [258, 162, 260],
  [258, 260, 259],
  [259, 260, 261],
  [259, 261, 165],
  [260, 162, 262],
  [260, 262, 261],
  [261, 262, 263],
  [261, 263, 165],
  [262, 162, 264],
  [262, 264, 263],
  [263, 264, 265],
  [263, 265, 165],
  [264, 162, 266],
  [264, 266, 265],
  [265, 266, 267],
  [265, 267, 165],
  [266, 162, 268],
  [266, 268, 267],
  [267, 268, 269],
  [267, 269, 165],
  [268, 162, 270],
  [268, 270, 269],
  [269, 270, 271],
  [269, 271, 165],
  [270, 162, 272],
  [270, 272, 271],
  [271, 272, 273],
  [271, 273, 165],
  [272, 162, 274],
  [272, 274, 273],
  [273, 274, 275],
  [273, 275, 165],
  [274, 162, 276],
  [274, 276, 275],
  [275, 276, 277],
  [275, 277, 165],
  [276, 162, 278],
  [276, 278, 277],
  [277, 278, 279],
  [277, 279, 165],
  [278, 162, 280],
  [278, 280, 279],
  [279, 280, 281],
  [279, 281, 165],
  [280, 162, 282],
  [280, 282, 281],
  [281, 282, 283],
  [281, 283, 165],
  [282, 162, 284],
  [282, 284, 283],
  [283, 284, 285],
  [283, 285, 165],
  [284, 162, 286],
  [284, 286, 285],
  [285, 286, 287],
  [285, 287, 165],
  [286, 162, 288],
  [286, 288, 287],
  [287, 288, 289],
  [287, 289, 165],
  [288, 162, 290],
  [288, 290, 289],
  [289, 290, 291],
  [289, 291, 165],
  [290, 162, 163],
  [290, 163, 291],
  [291, 163, 164],
  [291, 164, 165],
]);
